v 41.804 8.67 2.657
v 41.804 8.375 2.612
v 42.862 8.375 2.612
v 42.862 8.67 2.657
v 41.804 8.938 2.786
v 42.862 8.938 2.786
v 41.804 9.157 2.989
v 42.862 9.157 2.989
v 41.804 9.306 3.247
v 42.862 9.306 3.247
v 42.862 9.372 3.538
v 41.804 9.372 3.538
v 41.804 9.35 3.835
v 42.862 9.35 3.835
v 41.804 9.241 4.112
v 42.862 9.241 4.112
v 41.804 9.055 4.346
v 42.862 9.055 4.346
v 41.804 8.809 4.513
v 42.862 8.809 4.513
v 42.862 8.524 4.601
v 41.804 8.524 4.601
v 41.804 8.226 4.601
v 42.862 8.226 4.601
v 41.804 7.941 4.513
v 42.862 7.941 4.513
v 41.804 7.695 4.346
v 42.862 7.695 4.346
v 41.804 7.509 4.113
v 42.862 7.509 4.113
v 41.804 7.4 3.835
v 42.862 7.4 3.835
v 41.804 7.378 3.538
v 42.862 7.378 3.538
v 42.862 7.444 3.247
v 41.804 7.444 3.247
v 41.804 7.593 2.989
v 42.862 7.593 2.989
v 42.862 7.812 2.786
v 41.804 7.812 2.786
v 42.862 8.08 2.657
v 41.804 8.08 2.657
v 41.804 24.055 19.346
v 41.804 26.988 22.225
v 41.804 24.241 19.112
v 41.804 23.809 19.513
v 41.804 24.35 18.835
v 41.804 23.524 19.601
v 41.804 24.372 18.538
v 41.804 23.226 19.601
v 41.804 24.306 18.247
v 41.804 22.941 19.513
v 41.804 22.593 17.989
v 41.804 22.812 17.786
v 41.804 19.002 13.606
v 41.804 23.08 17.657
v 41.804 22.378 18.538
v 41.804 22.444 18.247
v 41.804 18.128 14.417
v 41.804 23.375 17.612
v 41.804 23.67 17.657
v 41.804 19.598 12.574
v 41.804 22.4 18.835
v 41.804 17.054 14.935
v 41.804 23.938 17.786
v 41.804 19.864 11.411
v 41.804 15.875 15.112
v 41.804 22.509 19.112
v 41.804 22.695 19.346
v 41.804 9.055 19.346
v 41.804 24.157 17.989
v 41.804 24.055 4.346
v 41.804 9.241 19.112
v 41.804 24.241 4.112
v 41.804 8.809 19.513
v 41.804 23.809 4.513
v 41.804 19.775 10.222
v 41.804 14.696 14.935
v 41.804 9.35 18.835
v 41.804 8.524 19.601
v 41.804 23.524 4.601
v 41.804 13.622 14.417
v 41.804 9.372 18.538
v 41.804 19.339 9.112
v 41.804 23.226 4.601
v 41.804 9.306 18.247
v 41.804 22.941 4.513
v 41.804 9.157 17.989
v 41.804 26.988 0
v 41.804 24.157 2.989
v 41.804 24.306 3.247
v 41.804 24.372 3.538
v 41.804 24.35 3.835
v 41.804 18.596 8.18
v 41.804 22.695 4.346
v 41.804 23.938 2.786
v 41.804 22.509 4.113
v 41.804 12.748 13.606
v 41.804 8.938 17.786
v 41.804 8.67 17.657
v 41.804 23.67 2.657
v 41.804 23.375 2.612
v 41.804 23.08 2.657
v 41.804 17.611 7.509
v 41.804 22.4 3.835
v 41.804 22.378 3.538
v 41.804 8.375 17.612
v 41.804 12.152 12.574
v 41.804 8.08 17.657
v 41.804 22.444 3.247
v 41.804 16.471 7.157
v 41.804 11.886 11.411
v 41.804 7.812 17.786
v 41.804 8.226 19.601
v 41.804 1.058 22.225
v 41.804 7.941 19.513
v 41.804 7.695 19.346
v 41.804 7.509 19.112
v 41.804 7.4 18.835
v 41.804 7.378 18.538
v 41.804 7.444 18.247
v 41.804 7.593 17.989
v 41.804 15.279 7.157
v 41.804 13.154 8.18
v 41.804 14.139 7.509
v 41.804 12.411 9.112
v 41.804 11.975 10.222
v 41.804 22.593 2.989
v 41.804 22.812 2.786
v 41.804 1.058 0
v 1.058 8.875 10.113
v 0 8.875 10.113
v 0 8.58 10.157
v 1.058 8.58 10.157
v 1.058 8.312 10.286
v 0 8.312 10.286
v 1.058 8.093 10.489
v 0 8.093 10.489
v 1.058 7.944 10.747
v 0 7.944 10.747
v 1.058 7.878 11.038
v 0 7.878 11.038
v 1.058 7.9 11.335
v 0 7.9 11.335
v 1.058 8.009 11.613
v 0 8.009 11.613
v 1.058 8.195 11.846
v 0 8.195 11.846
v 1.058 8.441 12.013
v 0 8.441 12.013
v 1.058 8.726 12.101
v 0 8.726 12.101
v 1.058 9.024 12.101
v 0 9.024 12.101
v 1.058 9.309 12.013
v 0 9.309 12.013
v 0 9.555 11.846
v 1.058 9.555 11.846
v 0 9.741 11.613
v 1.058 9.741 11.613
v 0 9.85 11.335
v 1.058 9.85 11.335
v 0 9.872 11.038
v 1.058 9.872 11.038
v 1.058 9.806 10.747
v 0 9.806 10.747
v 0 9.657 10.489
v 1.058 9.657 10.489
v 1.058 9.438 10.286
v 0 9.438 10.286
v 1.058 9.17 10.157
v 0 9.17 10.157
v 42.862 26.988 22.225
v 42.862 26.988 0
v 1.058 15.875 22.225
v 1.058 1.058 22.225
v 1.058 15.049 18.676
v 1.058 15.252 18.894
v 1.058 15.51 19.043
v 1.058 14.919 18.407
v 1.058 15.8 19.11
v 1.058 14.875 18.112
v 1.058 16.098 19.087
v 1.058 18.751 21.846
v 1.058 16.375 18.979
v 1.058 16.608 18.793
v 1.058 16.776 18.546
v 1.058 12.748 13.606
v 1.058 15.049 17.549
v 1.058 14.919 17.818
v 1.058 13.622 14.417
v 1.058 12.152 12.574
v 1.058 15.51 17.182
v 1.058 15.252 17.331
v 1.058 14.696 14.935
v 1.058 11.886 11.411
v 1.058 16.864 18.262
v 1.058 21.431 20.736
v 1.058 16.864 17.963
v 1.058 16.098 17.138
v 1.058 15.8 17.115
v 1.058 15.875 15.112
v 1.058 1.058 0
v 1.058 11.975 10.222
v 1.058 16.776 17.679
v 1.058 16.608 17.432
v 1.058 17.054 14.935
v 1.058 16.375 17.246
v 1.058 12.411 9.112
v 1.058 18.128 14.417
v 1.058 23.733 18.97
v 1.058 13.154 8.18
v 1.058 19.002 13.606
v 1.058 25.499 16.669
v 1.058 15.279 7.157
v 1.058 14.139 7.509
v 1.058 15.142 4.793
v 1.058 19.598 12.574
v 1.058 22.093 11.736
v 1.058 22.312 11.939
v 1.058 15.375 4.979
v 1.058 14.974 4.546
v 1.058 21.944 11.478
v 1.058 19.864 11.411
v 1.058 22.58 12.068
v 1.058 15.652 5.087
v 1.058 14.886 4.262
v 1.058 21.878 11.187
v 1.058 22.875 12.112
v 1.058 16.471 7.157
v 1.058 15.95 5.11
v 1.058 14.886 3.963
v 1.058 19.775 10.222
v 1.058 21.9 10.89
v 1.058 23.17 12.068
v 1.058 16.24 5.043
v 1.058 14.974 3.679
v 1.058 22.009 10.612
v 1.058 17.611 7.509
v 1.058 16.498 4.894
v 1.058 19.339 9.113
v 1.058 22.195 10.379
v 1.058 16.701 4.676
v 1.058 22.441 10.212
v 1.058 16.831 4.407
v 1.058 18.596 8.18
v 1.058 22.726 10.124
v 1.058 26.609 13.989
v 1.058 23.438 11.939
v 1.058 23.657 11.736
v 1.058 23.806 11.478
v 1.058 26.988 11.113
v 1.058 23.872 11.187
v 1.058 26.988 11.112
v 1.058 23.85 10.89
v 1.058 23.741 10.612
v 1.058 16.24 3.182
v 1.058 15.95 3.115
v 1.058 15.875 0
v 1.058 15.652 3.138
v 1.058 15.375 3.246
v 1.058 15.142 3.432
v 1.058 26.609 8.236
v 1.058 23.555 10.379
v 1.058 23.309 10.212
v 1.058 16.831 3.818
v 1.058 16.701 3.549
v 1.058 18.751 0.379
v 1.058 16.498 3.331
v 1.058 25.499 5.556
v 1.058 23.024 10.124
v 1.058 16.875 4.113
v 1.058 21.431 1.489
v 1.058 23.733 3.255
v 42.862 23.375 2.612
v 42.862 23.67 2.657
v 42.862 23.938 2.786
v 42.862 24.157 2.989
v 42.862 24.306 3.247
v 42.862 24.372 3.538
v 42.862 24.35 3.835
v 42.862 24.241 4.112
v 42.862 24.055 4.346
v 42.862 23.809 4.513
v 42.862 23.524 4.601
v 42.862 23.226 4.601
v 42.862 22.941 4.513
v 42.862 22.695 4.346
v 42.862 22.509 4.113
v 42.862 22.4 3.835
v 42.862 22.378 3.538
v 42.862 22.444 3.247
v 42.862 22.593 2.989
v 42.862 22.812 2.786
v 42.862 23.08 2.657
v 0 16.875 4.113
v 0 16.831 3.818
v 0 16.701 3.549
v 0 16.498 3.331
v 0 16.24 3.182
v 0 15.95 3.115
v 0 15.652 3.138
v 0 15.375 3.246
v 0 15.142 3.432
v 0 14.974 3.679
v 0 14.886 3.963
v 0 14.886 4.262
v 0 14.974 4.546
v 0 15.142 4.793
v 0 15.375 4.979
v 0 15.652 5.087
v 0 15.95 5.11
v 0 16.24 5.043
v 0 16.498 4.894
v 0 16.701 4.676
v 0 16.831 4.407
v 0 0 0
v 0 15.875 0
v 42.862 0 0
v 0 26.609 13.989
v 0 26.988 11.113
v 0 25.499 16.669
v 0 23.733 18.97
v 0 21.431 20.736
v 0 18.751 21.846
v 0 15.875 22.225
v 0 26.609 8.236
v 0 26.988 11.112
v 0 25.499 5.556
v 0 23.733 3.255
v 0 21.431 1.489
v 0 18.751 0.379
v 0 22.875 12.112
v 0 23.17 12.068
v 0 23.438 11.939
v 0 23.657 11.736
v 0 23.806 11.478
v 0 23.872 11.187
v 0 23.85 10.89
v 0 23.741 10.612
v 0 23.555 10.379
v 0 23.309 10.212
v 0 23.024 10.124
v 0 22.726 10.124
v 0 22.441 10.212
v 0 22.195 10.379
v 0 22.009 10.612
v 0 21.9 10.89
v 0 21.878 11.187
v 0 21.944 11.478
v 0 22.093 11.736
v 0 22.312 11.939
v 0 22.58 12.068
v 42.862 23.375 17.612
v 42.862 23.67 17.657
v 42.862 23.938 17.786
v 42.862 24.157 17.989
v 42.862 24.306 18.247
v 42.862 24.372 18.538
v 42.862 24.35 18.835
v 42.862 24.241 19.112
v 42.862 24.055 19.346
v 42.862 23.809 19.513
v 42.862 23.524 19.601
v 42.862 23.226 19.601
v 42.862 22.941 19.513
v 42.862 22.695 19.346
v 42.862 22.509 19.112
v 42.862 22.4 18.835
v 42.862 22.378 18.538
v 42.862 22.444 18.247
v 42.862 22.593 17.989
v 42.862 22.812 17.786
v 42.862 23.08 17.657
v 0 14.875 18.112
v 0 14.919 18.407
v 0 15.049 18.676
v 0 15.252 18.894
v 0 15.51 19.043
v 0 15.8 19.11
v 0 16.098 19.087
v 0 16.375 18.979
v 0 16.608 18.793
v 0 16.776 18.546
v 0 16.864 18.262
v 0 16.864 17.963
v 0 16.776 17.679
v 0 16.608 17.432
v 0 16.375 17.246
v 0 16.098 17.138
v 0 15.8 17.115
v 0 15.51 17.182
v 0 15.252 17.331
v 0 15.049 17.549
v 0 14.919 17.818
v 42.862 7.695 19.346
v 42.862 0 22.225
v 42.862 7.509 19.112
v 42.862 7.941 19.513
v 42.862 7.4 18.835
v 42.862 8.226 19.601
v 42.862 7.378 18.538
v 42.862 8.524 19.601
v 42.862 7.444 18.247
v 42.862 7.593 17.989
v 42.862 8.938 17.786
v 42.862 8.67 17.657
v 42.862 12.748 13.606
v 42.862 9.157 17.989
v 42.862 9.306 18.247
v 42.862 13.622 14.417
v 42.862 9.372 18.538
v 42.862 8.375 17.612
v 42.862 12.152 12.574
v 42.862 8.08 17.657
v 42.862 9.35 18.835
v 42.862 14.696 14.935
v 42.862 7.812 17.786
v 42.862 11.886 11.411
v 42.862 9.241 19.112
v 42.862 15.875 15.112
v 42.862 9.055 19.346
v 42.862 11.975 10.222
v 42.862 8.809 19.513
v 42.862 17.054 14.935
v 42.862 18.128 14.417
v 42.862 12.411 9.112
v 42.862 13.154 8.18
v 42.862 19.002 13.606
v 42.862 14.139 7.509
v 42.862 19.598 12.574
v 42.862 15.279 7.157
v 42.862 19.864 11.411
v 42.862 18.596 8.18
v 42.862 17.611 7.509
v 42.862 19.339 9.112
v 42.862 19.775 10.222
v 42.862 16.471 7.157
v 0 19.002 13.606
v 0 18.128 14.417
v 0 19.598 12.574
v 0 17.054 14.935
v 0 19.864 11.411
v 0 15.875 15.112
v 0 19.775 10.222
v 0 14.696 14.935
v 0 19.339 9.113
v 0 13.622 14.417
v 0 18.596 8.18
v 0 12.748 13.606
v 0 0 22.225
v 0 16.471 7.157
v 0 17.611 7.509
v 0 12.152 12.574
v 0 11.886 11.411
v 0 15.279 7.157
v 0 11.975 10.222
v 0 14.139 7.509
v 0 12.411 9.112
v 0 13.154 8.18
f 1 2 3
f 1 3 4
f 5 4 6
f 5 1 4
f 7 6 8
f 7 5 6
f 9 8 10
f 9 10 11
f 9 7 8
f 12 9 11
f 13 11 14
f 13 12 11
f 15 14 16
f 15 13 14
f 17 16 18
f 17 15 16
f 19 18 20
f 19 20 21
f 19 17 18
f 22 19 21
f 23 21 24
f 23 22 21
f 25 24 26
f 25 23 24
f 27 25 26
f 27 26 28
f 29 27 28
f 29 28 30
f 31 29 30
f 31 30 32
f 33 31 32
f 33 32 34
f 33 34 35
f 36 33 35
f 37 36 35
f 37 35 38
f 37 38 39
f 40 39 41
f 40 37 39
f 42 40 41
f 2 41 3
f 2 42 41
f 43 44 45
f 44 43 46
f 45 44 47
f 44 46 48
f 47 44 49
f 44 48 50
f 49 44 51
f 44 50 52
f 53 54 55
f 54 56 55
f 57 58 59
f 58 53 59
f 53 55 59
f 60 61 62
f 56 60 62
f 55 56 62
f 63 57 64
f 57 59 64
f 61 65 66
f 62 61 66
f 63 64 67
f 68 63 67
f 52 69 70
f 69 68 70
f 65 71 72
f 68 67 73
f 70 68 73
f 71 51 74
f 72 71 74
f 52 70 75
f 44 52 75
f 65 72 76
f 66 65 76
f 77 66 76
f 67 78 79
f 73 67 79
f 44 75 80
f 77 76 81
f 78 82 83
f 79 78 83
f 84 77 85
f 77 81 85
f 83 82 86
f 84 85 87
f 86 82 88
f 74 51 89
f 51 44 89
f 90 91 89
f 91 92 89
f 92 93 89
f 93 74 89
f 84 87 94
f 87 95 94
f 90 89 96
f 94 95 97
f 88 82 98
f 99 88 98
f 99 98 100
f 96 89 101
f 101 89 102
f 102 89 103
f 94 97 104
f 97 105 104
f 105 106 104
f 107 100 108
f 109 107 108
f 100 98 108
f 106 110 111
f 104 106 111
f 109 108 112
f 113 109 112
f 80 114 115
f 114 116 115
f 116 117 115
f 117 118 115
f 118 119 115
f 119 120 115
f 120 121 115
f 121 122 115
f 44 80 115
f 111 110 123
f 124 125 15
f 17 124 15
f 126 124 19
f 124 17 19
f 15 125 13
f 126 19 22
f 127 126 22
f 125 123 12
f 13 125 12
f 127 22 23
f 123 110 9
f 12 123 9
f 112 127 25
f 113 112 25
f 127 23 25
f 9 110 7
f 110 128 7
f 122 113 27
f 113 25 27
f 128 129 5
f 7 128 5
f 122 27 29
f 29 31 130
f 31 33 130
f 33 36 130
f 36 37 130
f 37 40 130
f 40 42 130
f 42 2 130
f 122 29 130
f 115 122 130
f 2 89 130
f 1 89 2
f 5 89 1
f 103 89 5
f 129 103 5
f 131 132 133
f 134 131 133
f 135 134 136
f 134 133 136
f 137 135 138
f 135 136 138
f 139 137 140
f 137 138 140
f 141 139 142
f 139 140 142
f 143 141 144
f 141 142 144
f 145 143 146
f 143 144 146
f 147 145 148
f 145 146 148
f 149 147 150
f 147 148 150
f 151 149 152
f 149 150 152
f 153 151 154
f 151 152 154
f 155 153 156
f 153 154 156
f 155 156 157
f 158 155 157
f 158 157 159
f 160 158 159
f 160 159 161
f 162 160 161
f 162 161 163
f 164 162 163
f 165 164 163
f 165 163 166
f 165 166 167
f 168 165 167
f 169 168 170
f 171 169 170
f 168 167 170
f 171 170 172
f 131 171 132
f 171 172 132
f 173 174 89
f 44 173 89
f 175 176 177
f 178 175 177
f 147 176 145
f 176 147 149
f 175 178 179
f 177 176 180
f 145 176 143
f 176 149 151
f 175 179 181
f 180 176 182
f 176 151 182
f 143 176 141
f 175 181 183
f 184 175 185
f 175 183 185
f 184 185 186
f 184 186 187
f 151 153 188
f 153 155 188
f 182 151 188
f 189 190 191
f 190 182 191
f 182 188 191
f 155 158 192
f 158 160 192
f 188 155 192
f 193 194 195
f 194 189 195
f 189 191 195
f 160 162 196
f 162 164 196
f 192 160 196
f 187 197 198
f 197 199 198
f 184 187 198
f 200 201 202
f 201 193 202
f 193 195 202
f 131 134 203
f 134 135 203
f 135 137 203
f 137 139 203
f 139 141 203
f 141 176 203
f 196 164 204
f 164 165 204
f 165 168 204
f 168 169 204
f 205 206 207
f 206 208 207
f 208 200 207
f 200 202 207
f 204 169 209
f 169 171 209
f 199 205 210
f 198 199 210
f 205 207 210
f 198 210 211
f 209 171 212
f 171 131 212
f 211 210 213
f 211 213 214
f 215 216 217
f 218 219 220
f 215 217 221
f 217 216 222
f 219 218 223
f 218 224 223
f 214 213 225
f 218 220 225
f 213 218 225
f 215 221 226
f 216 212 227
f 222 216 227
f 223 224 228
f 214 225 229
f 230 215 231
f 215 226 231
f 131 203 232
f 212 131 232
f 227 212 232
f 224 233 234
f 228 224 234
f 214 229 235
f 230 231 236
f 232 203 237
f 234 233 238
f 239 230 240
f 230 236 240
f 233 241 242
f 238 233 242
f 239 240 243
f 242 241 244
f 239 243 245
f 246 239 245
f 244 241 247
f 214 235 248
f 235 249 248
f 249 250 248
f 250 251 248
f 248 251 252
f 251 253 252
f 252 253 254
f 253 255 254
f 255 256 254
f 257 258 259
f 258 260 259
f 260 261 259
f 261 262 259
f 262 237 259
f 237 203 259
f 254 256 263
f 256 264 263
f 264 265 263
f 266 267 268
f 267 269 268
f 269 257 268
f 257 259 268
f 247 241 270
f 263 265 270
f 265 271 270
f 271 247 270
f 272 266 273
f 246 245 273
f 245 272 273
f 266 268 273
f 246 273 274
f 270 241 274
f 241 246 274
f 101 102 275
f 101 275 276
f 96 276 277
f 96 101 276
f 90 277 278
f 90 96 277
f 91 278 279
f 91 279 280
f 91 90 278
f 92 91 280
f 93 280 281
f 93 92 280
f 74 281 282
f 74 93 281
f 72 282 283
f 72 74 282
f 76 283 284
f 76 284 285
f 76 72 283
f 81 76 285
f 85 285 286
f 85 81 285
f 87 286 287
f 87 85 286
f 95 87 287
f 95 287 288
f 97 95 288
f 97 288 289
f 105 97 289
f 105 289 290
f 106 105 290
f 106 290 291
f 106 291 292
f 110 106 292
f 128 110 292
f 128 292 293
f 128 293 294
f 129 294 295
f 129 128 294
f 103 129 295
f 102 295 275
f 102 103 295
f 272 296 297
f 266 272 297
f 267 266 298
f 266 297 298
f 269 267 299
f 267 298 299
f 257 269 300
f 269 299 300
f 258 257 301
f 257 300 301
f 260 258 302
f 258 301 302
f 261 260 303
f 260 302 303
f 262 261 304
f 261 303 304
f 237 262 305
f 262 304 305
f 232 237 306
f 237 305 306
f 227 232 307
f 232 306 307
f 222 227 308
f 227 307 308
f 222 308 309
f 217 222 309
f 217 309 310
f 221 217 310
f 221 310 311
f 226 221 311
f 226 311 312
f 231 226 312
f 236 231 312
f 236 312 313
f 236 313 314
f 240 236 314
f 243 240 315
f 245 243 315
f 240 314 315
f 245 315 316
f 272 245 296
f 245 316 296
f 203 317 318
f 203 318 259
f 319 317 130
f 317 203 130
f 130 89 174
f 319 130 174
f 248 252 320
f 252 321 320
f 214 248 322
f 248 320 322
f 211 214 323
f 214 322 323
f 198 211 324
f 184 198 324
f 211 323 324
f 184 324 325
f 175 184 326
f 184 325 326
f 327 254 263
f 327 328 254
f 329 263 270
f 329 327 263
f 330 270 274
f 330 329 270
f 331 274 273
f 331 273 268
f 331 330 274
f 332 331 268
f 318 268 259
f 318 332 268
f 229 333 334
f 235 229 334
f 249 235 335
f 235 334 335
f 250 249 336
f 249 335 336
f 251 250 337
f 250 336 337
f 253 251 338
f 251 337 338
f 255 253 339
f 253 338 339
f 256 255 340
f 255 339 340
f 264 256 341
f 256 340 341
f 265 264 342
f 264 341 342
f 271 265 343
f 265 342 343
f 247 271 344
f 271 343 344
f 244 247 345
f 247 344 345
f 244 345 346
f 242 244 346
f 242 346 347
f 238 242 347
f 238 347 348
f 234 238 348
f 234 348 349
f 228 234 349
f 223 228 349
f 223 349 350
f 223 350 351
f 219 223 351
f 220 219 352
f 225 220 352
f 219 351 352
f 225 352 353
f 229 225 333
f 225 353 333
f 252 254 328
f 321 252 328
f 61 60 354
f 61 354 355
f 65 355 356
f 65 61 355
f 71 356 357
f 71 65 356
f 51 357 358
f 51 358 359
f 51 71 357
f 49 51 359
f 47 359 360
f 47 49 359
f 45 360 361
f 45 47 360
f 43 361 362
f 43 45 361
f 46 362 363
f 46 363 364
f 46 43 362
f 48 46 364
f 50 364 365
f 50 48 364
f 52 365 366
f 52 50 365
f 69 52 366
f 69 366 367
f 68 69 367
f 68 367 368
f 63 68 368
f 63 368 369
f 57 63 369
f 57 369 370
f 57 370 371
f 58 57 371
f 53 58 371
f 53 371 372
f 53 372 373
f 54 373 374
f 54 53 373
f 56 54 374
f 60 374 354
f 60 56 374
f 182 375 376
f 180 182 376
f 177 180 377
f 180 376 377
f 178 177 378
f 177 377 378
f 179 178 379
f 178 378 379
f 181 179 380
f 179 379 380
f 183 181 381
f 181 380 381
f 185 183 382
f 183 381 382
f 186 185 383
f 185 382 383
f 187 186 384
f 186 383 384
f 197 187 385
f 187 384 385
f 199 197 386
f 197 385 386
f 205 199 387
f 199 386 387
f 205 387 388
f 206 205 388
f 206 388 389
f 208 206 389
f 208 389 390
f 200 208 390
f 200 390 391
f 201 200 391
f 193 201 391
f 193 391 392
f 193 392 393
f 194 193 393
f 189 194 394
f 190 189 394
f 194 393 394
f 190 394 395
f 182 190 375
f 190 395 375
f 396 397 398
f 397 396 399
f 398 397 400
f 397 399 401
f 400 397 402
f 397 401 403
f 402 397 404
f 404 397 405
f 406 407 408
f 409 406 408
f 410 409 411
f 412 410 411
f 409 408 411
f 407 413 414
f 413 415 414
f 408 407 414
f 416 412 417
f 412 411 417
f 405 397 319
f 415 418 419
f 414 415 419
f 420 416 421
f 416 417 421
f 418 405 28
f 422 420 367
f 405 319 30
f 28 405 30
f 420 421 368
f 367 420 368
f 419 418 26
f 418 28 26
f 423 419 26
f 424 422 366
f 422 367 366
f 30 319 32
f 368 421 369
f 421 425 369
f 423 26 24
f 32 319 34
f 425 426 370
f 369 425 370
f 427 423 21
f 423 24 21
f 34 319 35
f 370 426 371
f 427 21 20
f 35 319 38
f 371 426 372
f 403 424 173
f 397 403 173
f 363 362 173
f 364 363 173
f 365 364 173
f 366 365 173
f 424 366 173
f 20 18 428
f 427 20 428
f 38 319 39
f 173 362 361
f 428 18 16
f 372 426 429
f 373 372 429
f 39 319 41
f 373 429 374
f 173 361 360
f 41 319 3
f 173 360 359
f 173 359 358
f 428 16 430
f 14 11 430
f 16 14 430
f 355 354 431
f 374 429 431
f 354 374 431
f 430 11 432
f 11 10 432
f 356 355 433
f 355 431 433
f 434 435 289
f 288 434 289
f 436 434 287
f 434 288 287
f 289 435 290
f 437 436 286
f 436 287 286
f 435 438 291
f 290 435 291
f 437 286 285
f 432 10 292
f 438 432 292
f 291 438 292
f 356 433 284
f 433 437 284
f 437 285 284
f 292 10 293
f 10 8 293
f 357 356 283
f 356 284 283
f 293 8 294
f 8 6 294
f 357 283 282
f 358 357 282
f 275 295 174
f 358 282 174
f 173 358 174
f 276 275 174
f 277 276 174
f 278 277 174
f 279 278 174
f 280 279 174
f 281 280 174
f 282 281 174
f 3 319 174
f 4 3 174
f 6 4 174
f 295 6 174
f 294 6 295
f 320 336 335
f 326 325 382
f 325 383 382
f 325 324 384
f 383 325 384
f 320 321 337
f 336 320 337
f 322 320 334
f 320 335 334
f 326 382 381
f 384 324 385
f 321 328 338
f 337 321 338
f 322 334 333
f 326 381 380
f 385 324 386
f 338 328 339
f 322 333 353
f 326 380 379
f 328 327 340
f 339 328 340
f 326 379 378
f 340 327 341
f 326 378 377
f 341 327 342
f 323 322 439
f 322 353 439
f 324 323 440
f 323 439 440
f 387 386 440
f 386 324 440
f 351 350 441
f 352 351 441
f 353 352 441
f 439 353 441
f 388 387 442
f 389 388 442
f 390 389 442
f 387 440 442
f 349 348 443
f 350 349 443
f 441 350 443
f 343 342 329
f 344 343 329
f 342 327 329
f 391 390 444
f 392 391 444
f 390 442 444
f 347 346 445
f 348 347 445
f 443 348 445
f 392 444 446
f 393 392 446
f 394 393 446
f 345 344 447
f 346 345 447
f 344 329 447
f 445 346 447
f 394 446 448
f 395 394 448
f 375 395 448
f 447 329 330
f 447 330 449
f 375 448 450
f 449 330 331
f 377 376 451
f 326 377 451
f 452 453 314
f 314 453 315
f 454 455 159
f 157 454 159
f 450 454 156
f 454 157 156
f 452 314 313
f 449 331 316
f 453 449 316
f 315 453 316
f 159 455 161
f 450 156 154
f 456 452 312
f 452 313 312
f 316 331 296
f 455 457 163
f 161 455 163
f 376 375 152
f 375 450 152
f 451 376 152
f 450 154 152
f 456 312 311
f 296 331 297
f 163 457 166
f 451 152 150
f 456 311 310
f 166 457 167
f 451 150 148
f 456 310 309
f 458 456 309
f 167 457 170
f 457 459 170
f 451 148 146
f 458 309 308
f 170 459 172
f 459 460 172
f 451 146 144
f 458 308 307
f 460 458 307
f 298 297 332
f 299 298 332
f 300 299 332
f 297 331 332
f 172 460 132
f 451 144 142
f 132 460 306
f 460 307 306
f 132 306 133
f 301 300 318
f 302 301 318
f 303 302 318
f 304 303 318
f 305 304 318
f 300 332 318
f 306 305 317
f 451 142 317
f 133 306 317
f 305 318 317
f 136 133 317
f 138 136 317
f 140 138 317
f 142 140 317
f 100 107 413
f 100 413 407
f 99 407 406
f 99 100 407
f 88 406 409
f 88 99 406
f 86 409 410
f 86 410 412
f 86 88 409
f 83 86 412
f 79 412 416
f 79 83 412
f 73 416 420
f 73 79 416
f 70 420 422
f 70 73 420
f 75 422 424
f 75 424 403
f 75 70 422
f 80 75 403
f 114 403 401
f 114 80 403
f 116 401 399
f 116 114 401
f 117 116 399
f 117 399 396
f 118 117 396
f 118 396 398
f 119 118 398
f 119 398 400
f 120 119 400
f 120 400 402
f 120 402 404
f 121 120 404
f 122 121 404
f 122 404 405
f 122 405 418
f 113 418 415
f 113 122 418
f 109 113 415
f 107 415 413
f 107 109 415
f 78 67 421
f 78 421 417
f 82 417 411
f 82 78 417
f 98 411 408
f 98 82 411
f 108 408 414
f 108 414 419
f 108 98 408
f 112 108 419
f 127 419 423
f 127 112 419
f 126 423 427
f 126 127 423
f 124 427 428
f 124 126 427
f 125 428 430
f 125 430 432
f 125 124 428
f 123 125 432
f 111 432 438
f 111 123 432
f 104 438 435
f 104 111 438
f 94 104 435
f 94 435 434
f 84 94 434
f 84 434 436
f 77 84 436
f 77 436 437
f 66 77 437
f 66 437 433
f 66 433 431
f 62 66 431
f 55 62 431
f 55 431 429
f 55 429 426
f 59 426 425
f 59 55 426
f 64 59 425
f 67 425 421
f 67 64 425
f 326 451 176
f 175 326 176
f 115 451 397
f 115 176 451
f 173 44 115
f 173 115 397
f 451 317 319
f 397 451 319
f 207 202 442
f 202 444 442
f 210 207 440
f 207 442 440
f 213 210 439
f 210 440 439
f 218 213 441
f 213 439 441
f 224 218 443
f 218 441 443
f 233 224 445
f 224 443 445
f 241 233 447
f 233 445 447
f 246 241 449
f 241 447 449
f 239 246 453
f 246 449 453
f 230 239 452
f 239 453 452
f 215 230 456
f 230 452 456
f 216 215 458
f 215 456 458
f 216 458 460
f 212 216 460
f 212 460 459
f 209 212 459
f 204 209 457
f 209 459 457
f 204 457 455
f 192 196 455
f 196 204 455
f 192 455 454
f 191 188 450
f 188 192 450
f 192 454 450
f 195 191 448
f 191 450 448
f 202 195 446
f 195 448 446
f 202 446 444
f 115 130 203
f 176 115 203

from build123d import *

# Parameters (mm, degrees)
BOSS_EXTRUDE1_DEPTH = 22.225
FILLET1_R           = 11.1125
SKETCH3_R           = 4
SKETCH3_R_2         = 1
CUT_EXTRUDE2_DEPTH  = 1.058333333
CIRPATTERN1_COUNT   = 4
CUT_EXTRUDE3_START  = -1.058333333
SKETCH2_R           = 1
SKETCH2_R_2         = 4
CUT_EXTRUDE3_DEPTH  = 1.058333333


with BuildPart() as part:
    # Sketch1 → Boss-Extrude1 (new body)
    with BuildSketch(Plane.XY):
        Polygon((0, 26.9875), (0, 0), (42.8625, 0), (42.8625, 26.9875), (41.804166667, 26.9875), (41.804166667, 1.058333333), (1.058333333, 1.058333333), (1.058333333, 26.9875), align=None)
    extrude(amount=BOSS_EXTRUDE1_DEPTH)

    # Fillet1
    fillet1_edges = [part.edges().sort_by_distance(p)[0] for p in [
        (0.529166667, 26.9875, 0),
        (0.529166667, 26.9875, 22.225),
    ]]
    fillet(fillet1_edges, radius=FILLET1_R - 0.0001)  # a hair under: the kernel refuses the full size

    # Sketch3 → Cut-Extrude2 (cut)
    with BuildSketch(Plane.ZY):
        with Locations((11.1125, 15.875)):
            Circle(SKETCH3_R)
        with Locations((11.1125, 22.875)):
            Circle(SKETCH3_R_2)
    cut_extrude2 = extrude(amount=-CUT_EXTRUDE2_DEPTH, mode=Mode.SUBTRACT)

    # CirPattern1: Cut-Extrude2 ×4 about axis
    cirpattern1_axis = Axis((0, 15.875, 11.1125), (1, 0, 0))
    for i in range(1, CIRPATTERN1_COUNT):
        add(cut_extrude2.rotate(cirpattern1_axis, i * 360 / CIRPATTERN1_COUNT), mode=Mode.SUBTRACT)

    # Sketch2 → Cut-Extrude3 (cut)
    with BuildSketch(Plane(origin=(42.8625, 0, 0), x_dir=(0, 0, -1), z_dir=(1, 0, 0)).offset(CUT_EXTRUDE3_START)):
        with Locations((-3.6125, 23.375)):
            Circle(SKETCH2_R)
        with Locations((-18.6125, 23.375)):
            Circle(SKETCH2_R)
        with Locations((-3.6125, 8.375)):
            Circle(SKETCH2_R)
        with Locations((-18.6125, 8.375)):
            Circle(SKETCH2_R)
        with Locations(Location((-11.1125, 15.875, 0), (0, 0, 180))):
            Circle(SKETCH2_R_2)
    extrude(amount=CUT_EXTRUDE3_DEPTH, mode=Mode.SUBTRACT)


solid = part.part
